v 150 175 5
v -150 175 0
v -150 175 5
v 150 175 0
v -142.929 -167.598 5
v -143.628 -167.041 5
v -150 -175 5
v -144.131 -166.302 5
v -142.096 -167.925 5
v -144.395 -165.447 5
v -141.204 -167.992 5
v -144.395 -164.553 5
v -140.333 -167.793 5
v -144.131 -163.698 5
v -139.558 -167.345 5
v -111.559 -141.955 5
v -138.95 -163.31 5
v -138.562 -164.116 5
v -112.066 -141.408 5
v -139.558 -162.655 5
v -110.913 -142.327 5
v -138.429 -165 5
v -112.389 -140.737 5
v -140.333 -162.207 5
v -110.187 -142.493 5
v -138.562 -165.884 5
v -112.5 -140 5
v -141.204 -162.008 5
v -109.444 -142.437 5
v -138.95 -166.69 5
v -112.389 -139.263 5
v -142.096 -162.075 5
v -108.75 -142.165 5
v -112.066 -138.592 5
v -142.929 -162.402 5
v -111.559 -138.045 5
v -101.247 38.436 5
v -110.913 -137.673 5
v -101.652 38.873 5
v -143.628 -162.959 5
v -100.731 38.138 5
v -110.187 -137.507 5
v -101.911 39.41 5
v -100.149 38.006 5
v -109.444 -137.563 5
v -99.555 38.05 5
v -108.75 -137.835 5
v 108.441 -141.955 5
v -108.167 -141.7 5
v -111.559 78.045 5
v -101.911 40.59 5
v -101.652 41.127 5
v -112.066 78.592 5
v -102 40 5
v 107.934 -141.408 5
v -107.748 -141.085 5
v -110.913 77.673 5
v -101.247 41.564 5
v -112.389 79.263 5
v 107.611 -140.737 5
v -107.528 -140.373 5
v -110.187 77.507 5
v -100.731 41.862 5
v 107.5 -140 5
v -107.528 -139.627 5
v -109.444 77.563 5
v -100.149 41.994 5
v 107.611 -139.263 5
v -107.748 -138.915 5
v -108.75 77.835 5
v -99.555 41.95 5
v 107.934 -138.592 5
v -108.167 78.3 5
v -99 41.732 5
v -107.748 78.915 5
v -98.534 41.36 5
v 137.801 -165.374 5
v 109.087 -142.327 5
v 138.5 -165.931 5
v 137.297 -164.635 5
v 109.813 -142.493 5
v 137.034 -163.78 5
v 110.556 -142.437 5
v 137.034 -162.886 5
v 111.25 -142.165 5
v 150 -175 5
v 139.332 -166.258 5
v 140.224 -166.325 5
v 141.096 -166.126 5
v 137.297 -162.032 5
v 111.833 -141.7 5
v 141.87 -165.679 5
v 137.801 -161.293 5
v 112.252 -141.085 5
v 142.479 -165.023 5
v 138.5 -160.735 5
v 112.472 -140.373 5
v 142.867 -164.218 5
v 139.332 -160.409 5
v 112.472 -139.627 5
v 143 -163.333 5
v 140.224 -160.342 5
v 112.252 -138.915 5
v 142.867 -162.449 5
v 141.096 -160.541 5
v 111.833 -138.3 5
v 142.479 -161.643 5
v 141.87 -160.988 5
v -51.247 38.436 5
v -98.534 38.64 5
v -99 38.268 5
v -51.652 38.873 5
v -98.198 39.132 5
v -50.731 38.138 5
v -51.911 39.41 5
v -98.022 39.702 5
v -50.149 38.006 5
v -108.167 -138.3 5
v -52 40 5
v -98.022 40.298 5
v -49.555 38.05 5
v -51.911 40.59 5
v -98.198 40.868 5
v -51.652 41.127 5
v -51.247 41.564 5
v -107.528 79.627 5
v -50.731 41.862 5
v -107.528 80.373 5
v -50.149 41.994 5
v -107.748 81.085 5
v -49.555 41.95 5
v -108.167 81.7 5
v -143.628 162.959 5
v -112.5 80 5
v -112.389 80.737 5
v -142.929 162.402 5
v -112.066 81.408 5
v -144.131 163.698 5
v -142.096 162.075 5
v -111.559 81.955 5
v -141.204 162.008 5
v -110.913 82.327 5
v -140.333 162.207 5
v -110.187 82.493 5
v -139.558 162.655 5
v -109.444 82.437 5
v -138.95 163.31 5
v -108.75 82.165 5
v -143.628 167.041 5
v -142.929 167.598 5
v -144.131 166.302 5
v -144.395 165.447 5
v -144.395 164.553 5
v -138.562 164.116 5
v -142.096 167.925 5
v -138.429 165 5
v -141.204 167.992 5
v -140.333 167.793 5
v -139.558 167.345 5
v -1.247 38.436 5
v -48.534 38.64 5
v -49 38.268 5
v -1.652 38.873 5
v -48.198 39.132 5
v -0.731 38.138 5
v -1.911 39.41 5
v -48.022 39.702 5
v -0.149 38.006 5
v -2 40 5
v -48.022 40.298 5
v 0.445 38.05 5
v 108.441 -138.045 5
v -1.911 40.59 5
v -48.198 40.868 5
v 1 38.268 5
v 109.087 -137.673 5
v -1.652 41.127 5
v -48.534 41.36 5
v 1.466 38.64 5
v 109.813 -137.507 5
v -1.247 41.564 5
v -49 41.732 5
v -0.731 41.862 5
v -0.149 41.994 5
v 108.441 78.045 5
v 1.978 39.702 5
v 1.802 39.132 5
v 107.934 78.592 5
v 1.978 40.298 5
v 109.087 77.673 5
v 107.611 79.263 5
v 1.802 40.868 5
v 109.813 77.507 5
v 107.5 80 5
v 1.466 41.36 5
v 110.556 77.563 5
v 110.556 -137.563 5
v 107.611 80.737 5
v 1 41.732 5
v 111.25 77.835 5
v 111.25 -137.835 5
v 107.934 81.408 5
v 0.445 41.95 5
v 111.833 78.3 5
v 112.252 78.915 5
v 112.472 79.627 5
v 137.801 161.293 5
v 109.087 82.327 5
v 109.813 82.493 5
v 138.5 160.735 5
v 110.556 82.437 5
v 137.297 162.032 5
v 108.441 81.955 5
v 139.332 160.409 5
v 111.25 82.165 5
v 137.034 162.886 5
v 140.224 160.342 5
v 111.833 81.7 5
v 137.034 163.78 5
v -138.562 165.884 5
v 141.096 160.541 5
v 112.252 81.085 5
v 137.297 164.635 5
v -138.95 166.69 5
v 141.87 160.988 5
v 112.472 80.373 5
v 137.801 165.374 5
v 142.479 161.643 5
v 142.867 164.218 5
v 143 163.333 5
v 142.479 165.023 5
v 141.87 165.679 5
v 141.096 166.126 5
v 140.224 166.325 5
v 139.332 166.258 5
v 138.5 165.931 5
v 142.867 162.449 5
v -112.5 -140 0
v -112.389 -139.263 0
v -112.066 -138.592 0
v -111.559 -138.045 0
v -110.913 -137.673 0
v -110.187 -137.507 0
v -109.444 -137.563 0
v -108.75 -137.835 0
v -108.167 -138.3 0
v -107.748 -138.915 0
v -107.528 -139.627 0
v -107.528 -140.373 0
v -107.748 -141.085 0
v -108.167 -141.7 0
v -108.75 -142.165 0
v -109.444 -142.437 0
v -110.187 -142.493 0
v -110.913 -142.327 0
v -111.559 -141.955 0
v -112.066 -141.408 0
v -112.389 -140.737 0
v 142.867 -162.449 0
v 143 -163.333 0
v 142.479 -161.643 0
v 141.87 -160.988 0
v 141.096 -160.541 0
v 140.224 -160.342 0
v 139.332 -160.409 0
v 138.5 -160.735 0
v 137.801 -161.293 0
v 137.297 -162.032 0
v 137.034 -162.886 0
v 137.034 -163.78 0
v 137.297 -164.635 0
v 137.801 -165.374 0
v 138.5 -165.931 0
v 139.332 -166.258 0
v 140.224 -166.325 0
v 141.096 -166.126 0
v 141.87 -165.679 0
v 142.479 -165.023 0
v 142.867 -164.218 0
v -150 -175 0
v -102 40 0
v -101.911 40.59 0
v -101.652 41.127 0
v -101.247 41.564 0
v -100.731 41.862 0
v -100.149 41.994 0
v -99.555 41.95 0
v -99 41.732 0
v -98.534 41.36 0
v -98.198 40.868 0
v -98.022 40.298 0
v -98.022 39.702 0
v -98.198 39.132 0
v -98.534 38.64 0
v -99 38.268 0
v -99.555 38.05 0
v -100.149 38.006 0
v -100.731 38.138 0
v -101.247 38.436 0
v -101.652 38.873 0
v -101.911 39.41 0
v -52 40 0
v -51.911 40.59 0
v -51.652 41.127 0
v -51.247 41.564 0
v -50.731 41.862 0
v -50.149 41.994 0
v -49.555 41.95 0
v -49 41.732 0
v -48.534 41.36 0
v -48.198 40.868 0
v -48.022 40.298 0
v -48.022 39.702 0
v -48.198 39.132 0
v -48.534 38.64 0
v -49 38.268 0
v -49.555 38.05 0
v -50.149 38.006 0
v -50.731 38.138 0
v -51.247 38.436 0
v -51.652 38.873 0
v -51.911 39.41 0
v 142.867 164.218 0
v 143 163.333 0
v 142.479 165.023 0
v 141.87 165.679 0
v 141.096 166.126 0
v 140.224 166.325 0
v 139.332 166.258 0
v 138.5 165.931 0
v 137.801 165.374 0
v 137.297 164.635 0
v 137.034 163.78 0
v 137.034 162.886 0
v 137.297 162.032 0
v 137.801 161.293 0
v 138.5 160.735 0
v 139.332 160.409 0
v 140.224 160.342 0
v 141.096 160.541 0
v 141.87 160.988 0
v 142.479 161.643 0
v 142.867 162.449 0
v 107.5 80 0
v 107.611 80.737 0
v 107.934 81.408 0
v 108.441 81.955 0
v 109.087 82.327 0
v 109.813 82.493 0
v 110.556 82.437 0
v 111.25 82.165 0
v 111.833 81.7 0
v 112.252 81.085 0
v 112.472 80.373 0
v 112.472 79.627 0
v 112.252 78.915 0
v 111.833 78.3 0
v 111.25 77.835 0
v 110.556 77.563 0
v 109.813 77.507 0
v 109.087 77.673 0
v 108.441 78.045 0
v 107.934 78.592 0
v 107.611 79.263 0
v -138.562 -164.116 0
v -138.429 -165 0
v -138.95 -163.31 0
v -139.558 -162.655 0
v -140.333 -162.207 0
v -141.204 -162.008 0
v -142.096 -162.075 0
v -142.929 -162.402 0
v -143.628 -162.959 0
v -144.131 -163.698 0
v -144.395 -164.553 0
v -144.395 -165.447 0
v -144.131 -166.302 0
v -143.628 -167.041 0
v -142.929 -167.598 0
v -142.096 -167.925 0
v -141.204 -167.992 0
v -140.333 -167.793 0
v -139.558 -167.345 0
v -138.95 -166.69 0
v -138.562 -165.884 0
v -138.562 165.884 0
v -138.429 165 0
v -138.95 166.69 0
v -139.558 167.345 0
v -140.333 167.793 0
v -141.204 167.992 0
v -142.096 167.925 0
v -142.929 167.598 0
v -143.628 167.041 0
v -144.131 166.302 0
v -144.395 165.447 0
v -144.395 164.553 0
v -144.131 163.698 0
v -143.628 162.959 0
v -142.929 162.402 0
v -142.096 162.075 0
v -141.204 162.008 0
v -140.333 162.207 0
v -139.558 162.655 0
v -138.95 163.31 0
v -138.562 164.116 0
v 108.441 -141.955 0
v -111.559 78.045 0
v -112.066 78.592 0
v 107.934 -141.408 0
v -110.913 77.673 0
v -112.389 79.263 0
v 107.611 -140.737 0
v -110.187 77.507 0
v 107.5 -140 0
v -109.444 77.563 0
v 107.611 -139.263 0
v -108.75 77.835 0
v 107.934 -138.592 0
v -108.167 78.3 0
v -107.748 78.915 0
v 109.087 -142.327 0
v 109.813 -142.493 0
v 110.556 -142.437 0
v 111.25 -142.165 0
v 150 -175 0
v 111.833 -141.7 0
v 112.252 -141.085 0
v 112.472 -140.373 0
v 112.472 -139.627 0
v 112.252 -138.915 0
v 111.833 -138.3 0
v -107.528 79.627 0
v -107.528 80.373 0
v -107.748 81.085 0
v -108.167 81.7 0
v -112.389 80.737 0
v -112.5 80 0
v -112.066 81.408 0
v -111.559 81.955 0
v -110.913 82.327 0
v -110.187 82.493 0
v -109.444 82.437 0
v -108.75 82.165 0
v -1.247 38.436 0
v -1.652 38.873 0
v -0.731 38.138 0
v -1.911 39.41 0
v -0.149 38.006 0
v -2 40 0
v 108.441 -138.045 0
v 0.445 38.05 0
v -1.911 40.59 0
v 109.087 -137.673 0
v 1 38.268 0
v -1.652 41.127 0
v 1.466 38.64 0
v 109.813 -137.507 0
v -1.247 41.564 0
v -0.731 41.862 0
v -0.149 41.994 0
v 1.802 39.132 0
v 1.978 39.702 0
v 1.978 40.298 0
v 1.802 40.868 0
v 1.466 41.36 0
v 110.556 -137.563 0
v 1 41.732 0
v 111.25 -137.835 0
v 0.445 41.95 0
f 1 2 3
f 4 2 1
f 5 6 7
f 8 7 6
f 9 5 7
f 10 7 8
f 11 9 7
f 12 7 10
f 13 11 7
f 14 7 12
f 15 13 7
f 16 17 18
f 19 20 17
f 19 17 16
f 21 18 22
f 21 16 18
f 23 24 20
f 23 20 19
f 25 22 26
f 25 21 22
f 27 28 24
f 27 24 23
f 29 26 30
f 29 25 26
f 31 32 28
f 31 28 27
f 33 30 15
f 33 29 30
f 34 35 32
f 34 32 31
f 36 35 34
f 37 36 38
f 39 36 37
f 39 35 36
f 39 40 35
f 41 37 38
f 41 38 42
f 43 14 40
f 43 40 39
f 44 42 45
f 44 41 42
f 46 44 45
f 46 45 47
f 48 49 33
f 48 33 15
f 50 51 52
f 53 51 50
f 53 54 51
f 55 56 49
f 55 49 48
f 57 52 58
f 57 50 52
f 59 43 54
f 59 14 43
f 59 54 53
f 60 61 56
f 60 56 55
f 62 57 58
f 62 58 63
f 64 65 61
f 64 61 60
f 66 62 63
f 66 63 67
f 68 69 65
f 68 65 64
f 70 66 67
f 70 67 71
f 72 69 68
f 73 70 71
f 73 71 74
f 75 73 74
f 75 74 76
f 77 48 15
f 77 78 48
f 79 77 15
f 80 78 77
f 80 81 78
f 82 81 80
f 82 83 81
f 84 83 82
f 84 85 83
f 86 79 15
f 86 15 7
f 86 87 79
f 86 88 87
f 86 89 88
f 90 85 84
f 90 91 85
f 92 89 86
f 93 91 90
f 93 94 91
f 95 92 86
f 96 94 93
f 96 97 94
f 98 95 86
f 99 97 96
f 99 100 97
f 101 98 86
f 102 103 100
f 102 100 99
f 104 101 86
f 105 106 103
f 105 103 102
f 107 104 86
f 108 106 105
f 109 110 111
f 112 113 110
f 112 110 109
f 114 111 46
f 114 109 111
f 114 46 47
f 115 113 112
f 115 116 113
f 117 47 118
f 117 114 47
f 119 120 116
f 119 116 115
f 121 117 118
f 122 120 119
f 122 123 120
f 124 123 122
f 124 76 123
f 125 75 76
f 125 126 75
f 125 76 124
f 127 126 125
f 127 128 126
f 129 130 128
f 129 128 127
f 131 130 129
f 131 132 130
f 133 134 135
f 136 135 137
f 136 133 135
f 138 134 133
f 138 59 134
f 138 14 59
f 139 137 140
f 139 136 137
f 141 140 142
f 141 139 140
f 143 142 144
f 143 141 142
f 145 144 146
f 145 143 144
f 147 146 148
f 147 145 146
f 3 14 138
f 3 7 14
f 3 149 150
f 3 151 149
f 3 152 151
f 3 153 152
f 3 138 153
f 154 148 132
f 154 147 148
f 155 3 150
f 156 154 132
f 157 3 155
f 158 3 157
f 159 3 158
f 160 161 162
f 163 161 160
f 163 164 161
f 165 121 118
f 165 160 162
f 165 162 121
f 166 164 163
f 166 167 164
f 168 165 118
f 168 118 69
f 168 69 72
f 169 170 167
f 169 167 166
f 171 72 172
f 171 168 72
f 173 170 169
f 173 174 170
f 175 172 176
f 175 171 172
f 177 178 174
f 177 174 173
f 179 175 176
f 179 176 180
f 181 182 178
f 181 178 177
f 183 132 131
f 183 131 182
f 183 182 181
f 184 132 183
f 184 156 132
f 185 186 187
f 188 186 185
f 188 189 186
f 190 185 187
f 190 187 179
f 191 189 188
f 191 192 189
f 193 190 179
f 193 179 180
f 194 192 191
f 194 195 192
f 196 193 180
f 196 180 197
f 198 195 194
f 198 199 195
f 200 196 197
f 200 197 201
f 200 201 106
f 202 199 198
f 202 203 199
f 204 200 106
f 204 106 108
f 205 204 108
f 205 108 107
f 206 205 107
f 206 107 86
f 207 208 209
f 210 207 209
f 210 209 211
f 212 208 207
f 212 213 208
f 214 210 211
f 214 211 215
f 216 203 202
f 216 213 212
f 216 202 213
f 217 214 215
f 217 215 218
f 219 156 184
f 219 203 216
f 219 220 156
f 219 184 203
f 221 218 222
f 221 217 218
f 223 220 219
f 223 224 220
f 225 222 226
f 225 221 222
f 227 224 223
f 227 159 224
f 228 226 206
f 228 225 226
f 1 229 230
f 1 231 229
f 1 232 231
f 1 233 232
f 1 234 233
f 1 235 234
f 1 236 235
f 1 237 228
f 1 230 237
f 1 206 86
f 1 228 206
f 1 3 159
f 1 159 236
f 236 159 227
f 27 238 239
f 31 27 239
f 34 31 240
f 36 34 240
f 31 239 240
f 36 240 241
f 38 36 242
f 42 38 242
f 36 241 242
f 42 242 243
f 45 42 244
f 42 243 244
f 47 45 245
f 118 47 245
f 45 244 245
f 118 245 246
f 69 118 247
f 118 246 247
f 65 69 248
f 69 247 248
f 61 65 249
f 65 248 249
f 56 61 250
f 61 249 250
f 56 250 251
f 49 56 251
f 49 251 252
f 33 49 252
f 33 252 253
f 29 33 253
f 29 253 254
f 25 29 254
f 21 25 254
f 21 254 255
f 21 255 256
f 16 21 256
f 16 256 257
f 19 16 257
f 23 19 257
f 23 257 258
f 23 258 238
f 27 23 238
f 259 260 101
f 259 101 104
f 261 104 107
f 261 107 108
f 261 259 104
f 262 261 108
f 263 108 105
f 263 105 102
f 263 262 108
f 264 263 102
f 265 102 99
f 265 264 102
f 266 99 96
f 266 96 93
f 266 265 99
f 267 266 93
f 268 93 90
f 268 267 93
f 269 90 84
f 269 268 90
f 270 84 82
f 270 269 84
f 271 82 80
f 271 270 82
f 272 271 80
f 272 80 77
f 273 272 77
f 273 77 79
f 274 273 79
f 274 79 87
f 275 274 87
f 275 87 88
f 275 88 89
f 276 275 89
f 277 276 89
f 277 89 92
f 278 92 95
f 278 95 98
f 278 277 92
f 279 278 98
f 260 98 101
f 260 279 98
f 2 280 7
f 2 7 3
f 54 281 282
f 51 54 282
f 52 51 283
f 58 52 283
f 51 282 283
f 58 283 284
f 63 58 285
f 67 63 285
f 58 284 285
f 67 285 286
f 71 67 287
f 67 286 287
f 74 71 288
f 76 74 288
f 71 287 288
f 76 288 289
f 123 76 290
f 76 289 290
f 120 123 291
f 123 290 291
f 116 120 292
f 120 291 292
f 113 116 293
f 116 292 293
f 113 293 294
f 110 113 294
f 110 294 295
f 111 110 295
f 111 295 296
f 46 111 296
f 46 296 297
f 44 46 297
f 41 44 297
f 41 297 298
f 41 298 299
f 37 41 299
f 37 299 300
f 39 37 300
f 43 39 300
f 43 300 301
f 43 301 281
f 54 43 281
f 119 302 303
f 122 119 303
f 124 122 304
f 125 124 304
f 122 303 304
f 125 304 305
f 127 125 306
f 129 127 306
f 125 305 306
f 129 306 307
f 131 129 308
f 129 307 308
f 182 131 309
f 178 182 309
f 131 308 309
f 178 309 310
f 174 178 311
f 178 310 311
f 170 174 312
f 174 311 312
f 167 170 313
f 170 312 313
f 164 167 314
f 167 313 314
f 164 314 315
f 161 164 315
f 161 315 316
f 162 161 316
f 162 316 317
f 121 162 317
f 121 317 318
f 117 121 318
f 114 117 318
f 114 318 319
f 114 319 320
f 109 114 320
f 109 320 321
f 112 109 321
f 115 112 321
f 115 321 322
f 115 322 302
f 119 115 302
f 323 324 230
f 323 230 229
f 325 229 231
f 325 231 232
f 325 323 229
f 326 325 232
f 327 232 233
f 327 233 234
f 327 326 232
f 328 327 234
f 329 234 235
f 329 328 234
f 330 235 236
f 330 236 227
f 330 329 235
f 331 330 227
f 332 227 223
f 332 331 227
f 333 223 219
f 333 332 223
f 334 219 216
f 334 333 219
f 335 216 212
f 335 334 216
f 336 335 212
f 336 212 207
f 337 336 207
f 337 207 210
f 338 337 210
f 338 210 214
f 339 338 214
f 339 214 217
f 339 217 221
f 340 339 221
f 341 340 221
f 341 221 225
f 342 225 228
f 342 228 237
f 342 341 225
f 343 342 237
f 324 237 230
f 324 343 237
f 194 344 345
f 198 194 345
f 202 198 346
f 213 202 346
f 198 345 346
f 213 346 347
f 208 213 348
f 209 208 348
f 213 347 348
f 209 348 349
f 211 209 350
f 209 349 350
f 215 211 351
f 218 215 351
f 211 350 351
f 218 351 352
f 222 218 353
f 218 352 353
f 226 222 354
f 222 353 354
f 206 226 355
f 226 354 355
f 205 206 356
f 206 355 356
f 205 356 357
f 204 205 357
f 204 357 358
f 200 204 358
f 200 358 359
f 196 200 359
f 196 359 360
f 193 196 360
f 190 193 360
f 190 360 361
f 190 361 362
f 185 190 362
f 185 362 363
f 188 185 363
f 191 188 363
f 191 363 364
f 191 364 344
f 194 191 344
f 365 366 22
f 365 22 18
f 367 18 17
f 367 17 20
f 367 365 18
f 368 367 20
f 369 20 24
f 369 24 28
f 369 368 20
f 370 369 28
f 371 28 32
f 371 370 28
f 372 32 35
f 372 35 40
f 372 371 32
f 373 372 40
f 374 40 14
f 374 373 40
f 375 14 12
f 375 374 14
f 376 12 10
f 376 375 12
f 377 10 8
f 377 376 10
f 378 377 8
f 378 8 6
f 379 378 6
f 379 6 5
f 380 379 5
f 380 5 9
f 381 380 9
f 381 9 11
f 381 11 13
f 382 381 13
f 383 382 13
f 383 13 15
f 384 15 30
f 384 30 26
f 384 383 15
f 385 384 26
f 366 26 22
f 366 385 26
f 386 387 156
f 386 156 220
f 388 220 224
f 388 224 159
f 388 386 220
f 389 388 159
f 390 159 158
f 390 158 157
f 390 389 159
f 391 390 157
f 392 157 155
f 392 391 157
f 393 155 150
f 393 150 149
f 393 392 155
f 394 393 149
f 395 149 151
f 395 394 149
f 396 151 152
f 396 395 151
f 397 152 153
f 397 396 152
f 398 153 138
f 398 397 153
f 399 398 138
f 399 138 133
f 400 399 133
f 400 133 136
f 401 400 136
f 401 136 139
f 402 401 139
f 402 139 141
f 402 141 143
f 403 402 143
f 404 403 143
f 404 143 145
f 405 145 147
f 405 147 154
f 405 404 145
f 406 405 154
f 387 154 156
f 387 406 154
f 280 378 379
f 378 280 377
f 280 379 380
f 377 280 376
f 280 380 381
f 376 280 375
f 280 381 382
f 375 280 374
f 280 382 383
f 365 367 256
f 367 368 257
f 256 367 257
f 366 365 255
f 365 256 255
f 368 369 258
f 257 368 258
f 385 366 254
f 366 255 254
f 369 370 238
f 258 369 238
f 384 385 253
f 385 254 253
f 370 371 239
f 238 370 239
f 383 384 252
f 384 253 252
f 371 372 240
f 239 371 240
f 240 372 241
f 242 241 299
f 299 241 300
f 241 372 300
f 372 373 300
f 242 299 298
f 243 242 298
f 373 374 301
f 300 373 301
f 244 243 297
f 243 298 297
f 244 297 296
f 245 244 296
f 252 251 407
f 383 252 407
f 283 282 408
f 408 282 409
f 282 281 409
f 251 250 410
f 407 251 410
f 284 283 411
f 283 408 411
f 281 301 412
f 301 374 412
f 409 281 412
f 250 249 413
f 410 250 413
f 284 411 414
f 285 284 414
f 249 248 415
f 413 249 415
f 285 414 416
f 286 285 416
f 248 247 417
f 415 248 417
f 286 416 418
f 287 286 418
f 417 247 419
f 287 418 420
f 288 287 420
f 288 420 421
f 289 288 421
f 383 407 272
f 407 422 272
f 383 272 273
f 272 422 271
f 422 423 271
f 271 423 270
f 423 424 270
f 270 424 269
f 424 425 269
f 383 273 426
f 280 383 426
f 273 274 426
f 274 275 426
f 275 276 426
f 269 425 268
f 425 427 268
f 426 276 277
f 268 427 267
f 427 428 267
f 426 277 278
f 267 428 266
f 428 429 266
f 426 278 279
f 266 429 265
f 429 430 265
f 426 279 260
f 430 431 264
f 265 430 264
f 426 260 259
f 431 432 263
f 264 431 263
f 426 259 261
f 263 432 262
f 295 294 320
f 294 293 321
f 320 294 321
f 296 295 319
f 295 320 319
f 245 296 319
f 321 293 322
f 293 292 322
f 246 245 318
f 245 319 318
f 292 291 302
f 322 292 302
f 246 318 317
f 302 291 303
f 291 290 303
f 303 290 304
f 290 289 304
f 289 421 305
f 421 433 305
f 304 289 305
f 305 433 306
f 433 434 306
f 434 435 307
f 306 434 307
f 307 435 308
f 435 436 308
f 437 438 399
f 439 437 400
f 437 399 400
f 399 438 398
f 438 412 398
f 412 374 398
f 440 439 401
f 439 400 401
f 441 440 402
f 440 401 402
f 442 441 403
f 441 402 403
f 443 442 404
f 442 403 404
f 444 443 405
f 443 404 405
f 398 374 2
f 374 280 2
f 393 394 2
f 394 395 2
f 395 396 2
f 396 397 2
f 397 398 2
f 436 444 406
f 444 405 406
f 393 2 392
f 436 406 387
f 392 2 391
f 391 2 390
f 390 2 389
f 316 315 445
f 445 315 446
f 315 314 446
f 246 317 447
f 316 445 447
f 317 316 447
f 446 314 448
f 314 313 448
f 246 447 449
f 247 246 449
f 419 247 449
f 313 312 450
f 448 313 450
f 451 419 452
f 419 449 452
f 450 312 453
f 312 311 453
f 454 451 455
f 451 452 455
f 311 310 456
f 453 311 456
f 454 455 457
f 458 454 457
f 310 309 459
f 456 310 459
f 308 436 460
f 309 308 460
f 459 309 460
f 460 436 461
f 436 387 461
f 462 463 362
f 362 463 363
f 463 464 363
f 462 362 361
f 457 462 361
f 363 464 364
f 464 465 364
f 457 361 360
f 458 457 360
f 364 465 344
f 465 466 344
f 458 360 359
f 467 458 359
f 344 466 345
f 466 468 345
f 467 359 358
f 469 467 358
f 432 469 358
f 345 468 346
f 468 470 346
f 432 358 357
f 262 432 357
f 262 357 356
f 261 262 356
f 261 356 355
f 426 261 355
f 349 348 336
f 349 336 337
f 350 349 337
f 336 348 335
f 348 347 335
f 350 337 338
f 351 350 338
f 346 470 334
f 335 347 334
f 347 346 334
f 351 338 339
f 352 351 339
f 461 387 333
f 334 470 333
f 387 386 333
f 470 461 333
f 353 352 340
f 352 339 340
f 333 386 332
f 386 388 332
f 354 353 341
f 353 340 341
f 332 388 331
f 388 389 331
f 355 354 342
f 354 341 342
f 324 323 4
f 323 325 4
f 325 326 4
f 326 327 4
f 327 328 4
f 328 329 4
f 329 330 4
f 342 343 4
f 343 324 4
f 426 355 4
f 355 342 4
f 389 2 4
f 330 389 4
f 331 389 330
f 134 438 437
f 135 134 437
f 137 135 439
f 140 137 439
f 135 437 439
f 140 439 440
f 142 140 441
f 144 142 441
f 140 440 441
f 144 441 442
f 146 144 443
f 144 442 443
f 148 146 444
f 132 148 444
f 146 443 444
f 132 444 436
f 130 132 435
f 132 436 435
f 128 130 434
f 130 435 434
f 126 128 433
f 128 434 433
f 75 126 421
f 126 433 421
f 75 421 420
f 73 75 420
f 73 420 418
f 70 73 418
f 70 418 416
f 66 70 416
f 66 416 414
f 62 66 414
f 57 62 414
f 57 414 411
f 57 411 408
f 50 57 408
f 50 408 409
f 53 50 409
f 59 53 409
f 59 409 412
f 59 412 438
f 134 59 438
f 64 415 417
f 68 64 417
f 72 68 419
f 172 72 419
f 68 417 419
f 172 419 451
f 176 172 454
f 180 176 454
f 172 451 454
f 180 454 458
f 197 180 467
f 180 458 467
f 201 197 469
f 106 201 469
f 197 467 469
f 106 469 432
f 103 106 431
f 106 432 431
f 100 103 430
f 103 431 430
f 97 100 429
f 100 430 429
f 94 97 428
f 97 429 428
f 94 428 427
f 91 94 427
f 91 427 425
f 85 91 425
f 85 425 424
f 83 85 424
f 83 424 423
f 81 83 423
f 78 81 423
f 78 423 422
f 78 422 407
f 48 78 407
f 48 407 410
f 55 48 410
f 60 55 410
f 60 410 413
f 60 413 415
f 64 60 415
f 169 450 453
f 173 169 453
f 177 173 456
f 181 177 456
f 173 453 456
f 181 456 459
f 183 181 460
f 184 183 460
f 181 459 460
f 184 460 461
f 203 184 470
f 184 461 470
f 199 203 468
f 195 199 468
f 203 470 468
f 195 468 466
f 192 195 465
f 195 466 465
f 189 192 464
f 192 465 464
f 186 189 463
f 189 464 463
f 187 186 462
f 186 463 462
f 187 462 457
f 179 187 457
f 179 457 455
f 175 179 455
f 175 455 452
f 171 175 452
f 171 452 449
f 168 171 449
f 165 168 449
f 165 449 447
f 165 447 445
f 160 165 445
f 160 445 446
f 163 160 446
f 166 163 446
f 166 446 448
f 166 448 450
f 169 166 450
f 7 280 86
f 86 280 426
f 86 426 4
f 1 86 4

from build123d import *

# Parameters (mm, degrees)
SKETCH1_W           = 300
SKETCH1_H           = 350
SKETCH1_R           = 3
BOSS_EXTRUDE1_DEPTH = 5
SKETCH2_R           = 2.5
CUT_EXTRUDE1_DEPTH  = 10
SKETCH3_R           = 2
CUT_EXTRUDE2_DEPTH  = 6


with BuildPart() as part:
    # Sketch1 → Boss-Extrude1 (new body)
    with BuildSketch(Plane.XY):
        Rectangle(SKETCH1_W, SKETCH1_H)
        with Locations((-141.428571429, 165)):
            Circle(SKETCH1_R, mode=Mode.SUBTRACT)
        with Locations((140, 163.333333333)):
            Circle(SKETCH1_R, mode=Mode.SUBTRACT)
        with Locations((140, -163.333333333)):
            Circle(SKETCH1_R, mode=Mode.SUBTRACT)
        with Locations((-141.428571429, -165)):
            Circle(SKETCH1_R, mode=Mode.SUBTRACT)
    extrude(amount=BOSS_EXTRUDE1_DEPTH)

    # Sketch2 → Cut-Extrude1 (cut)
    with BuildSketch(Plane(origin=(0, 0, 0), x_dir=(-1, 0, 0), z_dir=(0, 0, -1))):
        with Locations((110, -140)):
            Circle(SKETCH2_R)
        with Locations((-110, -140)):
            Circle(SKETCH2_R)
        with Locations((-110, 80)):
            Circle(SKETCH2_R)
        with Locations((110, 80)):
            Circle(SKETCH2_R)
    extrude(amount=-CUT_EXTRUDE1_DEPTH, mode=Mode.SUBTRACT)

    # Sketch3 → Cut-Extrude2 (cut, through all)
    with BuildSketch(Plane(origin=(0, 0, 0), x_dir=(-1, 0, 0), z_dir=(0, 0, -1))):
        with Locations((0, 40)):
            Circle(SKETCH3_R)
        with Locations((50, 40)):
            Circle(SKETCH3_R)
        with Locations((100, 40)):
            Circle(SKETCH3_R)
    extrude(amount=-CUT_EXTRUDE2_DEPTH, mode=Mode.SUBTRACT)


solid = part.part
